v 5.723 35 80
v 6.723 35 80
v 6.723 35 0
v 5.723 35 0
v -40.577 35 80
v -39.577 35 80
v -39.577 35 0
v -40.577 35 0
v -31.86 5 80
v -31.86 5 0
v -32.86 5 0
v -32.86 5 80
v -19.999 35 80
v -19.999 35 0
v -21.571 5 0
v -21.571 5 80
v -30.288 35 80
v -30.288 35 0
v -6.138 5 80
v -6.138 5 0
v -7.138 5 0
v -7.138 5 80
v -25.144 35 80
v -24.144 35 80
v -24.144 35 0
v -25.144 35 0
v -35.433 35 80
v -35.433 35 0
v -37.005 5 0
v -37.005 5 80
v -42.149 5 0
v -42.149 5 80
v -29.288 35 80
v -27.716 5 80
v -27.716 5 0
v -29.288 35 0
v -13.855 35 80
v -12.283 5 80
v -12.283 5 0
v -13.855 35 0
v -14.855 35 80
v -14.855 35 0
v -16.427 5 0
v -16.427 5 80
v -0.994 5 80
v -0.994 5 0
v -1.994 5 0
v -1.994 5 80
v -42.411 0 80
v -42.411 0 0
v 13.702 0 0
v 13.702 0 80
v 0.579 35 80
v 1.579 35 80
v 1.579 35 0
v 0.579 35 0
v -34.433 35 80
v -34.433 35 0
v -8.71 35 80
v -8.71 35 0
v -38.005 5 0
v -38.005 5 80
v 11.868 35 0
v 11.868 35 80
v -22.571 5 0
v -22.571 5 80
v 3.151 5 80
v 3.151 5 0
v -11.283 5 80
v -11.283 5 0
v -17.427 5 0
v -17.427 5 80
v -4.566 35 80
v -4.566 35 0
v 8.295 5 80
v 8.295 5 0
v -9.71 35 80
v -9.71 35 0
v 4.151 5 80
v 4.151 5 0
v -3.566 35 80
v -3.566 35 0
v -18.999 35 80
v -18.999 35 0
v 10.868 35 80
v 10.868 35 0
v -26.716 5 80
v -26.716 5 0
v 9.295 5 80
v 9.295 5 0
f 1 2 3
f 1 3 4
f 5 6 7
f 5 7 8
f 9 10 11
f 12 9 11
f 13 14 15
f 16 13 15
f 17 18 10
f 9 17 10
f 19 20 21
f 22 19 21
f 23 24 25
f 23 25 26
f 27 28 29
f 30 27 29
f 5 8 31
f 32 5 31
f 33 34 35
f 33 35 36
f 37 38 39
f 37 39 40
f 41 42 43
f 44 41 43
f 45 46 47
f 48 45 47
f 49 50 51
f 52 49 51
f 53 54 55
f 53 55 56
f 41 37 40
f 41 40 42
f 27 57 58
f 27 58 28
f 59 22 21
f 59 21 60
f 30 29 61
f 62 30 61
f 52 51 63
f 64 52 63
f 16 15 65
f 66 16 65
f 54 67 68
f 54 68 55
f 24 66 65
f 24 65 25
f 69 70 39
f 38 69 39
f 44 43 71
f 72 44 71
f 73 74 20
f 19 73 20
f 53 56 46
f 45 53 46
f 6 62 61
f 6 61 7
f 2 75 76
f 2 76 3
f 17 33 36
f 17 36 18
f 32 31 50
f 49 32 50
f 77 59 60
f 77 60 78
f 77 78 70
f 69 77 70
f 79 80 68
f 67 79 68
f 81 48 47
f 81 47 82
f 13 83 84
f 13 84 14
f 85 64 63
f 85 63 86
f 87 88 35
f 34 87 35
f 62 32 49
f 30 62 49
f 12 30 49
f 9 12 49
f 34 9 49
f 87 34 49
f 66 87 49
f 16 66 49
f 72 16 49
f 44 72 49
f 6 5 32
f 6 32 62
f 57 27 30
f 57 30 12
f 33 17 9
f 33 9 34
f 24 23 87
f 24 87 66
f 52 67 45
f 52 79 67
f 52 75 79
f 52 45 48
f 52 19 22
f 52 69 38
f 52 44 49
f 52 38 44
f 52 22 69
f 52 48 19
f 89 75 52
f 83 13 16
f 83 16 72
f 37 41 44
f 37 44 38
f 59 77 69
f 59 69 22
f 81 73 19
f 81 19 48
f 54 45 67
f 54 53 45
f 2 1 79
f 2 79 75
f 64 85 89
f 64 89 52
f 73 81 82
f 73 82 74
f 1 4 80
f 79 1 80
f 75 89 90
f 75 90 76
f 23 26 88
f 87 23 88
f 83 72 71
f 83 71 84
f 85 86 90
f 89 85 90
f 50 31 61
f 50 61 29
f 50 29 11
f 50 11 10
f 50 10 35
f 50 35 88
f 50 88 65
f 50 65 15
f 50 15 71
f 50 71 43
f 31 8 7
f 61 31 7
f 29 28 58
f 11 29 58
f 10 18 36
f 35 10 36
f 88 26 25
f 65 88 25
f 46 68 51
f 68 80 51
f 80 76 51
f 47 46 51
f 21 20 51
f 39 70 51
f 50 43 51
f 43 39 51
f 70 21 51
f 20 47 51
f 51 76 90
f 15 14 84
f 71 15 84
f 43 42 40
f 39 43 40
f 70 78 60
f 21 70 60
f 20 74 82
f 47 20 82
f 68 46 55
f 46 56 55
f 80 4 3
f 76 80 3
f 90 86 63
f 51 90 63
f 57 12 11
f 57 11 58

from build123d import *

# Parameters (mm, degrees)
BOSS_EXTRUDE1_DEPTH = 80


with BuildPart() as part:
    # Sketch1 → Boss-Extrude1 (new body)
    with BuildSketch(Plane.XY):
        Polygon((-24.257476664, 0), (0, 0), (13.70186971, 0), (11.867597435, 35), (10.867597435, 35), (9.295364057, 5), (8.295364057, 5), (6.723130678, 35), (5.723130678, 35), (4.1508973, 5), (3.150897297, 5), (1.578663918, 35), (0.578663918, 35), (-0.99356946, 5), (-1.993569463, 5), (-3.565802842, 35), (-4.565802842, 35), (-6.13803622, 5), (-7.138036223, 5), (-8.710269602, 35), (-9.710269602, 35), (-11.28250298, 5), (-12.282502983, 5), (-13.854736362, 35), (-14.854736362, 35), (-16.42696974, 5), (-17.426969743, 5), (-18.999203122, 35), (-19.999203122, 35), (-21.5714365, 5), (-22.571436503, 5), (-24.143669882, 35), (-25.143669882, 35), (-26.71590326, 5), (-27.715903263, 5), (-29.288136642, 35), (-30.288136642, 35), (-31.86037002, 5), (-32.860370023, 5), (-34.432603402, 35), (-35.432603402, 35), (-37.00483678, 5), (-38.004836783, 5), (-39.577070162, 35), (-40.577070162, 35), (-42.14930354, 5), (-42.411342437, 0), align=None)
    extrude(amount=BOSS_EXTRUDE1_DEPTH)


solid = part.part
